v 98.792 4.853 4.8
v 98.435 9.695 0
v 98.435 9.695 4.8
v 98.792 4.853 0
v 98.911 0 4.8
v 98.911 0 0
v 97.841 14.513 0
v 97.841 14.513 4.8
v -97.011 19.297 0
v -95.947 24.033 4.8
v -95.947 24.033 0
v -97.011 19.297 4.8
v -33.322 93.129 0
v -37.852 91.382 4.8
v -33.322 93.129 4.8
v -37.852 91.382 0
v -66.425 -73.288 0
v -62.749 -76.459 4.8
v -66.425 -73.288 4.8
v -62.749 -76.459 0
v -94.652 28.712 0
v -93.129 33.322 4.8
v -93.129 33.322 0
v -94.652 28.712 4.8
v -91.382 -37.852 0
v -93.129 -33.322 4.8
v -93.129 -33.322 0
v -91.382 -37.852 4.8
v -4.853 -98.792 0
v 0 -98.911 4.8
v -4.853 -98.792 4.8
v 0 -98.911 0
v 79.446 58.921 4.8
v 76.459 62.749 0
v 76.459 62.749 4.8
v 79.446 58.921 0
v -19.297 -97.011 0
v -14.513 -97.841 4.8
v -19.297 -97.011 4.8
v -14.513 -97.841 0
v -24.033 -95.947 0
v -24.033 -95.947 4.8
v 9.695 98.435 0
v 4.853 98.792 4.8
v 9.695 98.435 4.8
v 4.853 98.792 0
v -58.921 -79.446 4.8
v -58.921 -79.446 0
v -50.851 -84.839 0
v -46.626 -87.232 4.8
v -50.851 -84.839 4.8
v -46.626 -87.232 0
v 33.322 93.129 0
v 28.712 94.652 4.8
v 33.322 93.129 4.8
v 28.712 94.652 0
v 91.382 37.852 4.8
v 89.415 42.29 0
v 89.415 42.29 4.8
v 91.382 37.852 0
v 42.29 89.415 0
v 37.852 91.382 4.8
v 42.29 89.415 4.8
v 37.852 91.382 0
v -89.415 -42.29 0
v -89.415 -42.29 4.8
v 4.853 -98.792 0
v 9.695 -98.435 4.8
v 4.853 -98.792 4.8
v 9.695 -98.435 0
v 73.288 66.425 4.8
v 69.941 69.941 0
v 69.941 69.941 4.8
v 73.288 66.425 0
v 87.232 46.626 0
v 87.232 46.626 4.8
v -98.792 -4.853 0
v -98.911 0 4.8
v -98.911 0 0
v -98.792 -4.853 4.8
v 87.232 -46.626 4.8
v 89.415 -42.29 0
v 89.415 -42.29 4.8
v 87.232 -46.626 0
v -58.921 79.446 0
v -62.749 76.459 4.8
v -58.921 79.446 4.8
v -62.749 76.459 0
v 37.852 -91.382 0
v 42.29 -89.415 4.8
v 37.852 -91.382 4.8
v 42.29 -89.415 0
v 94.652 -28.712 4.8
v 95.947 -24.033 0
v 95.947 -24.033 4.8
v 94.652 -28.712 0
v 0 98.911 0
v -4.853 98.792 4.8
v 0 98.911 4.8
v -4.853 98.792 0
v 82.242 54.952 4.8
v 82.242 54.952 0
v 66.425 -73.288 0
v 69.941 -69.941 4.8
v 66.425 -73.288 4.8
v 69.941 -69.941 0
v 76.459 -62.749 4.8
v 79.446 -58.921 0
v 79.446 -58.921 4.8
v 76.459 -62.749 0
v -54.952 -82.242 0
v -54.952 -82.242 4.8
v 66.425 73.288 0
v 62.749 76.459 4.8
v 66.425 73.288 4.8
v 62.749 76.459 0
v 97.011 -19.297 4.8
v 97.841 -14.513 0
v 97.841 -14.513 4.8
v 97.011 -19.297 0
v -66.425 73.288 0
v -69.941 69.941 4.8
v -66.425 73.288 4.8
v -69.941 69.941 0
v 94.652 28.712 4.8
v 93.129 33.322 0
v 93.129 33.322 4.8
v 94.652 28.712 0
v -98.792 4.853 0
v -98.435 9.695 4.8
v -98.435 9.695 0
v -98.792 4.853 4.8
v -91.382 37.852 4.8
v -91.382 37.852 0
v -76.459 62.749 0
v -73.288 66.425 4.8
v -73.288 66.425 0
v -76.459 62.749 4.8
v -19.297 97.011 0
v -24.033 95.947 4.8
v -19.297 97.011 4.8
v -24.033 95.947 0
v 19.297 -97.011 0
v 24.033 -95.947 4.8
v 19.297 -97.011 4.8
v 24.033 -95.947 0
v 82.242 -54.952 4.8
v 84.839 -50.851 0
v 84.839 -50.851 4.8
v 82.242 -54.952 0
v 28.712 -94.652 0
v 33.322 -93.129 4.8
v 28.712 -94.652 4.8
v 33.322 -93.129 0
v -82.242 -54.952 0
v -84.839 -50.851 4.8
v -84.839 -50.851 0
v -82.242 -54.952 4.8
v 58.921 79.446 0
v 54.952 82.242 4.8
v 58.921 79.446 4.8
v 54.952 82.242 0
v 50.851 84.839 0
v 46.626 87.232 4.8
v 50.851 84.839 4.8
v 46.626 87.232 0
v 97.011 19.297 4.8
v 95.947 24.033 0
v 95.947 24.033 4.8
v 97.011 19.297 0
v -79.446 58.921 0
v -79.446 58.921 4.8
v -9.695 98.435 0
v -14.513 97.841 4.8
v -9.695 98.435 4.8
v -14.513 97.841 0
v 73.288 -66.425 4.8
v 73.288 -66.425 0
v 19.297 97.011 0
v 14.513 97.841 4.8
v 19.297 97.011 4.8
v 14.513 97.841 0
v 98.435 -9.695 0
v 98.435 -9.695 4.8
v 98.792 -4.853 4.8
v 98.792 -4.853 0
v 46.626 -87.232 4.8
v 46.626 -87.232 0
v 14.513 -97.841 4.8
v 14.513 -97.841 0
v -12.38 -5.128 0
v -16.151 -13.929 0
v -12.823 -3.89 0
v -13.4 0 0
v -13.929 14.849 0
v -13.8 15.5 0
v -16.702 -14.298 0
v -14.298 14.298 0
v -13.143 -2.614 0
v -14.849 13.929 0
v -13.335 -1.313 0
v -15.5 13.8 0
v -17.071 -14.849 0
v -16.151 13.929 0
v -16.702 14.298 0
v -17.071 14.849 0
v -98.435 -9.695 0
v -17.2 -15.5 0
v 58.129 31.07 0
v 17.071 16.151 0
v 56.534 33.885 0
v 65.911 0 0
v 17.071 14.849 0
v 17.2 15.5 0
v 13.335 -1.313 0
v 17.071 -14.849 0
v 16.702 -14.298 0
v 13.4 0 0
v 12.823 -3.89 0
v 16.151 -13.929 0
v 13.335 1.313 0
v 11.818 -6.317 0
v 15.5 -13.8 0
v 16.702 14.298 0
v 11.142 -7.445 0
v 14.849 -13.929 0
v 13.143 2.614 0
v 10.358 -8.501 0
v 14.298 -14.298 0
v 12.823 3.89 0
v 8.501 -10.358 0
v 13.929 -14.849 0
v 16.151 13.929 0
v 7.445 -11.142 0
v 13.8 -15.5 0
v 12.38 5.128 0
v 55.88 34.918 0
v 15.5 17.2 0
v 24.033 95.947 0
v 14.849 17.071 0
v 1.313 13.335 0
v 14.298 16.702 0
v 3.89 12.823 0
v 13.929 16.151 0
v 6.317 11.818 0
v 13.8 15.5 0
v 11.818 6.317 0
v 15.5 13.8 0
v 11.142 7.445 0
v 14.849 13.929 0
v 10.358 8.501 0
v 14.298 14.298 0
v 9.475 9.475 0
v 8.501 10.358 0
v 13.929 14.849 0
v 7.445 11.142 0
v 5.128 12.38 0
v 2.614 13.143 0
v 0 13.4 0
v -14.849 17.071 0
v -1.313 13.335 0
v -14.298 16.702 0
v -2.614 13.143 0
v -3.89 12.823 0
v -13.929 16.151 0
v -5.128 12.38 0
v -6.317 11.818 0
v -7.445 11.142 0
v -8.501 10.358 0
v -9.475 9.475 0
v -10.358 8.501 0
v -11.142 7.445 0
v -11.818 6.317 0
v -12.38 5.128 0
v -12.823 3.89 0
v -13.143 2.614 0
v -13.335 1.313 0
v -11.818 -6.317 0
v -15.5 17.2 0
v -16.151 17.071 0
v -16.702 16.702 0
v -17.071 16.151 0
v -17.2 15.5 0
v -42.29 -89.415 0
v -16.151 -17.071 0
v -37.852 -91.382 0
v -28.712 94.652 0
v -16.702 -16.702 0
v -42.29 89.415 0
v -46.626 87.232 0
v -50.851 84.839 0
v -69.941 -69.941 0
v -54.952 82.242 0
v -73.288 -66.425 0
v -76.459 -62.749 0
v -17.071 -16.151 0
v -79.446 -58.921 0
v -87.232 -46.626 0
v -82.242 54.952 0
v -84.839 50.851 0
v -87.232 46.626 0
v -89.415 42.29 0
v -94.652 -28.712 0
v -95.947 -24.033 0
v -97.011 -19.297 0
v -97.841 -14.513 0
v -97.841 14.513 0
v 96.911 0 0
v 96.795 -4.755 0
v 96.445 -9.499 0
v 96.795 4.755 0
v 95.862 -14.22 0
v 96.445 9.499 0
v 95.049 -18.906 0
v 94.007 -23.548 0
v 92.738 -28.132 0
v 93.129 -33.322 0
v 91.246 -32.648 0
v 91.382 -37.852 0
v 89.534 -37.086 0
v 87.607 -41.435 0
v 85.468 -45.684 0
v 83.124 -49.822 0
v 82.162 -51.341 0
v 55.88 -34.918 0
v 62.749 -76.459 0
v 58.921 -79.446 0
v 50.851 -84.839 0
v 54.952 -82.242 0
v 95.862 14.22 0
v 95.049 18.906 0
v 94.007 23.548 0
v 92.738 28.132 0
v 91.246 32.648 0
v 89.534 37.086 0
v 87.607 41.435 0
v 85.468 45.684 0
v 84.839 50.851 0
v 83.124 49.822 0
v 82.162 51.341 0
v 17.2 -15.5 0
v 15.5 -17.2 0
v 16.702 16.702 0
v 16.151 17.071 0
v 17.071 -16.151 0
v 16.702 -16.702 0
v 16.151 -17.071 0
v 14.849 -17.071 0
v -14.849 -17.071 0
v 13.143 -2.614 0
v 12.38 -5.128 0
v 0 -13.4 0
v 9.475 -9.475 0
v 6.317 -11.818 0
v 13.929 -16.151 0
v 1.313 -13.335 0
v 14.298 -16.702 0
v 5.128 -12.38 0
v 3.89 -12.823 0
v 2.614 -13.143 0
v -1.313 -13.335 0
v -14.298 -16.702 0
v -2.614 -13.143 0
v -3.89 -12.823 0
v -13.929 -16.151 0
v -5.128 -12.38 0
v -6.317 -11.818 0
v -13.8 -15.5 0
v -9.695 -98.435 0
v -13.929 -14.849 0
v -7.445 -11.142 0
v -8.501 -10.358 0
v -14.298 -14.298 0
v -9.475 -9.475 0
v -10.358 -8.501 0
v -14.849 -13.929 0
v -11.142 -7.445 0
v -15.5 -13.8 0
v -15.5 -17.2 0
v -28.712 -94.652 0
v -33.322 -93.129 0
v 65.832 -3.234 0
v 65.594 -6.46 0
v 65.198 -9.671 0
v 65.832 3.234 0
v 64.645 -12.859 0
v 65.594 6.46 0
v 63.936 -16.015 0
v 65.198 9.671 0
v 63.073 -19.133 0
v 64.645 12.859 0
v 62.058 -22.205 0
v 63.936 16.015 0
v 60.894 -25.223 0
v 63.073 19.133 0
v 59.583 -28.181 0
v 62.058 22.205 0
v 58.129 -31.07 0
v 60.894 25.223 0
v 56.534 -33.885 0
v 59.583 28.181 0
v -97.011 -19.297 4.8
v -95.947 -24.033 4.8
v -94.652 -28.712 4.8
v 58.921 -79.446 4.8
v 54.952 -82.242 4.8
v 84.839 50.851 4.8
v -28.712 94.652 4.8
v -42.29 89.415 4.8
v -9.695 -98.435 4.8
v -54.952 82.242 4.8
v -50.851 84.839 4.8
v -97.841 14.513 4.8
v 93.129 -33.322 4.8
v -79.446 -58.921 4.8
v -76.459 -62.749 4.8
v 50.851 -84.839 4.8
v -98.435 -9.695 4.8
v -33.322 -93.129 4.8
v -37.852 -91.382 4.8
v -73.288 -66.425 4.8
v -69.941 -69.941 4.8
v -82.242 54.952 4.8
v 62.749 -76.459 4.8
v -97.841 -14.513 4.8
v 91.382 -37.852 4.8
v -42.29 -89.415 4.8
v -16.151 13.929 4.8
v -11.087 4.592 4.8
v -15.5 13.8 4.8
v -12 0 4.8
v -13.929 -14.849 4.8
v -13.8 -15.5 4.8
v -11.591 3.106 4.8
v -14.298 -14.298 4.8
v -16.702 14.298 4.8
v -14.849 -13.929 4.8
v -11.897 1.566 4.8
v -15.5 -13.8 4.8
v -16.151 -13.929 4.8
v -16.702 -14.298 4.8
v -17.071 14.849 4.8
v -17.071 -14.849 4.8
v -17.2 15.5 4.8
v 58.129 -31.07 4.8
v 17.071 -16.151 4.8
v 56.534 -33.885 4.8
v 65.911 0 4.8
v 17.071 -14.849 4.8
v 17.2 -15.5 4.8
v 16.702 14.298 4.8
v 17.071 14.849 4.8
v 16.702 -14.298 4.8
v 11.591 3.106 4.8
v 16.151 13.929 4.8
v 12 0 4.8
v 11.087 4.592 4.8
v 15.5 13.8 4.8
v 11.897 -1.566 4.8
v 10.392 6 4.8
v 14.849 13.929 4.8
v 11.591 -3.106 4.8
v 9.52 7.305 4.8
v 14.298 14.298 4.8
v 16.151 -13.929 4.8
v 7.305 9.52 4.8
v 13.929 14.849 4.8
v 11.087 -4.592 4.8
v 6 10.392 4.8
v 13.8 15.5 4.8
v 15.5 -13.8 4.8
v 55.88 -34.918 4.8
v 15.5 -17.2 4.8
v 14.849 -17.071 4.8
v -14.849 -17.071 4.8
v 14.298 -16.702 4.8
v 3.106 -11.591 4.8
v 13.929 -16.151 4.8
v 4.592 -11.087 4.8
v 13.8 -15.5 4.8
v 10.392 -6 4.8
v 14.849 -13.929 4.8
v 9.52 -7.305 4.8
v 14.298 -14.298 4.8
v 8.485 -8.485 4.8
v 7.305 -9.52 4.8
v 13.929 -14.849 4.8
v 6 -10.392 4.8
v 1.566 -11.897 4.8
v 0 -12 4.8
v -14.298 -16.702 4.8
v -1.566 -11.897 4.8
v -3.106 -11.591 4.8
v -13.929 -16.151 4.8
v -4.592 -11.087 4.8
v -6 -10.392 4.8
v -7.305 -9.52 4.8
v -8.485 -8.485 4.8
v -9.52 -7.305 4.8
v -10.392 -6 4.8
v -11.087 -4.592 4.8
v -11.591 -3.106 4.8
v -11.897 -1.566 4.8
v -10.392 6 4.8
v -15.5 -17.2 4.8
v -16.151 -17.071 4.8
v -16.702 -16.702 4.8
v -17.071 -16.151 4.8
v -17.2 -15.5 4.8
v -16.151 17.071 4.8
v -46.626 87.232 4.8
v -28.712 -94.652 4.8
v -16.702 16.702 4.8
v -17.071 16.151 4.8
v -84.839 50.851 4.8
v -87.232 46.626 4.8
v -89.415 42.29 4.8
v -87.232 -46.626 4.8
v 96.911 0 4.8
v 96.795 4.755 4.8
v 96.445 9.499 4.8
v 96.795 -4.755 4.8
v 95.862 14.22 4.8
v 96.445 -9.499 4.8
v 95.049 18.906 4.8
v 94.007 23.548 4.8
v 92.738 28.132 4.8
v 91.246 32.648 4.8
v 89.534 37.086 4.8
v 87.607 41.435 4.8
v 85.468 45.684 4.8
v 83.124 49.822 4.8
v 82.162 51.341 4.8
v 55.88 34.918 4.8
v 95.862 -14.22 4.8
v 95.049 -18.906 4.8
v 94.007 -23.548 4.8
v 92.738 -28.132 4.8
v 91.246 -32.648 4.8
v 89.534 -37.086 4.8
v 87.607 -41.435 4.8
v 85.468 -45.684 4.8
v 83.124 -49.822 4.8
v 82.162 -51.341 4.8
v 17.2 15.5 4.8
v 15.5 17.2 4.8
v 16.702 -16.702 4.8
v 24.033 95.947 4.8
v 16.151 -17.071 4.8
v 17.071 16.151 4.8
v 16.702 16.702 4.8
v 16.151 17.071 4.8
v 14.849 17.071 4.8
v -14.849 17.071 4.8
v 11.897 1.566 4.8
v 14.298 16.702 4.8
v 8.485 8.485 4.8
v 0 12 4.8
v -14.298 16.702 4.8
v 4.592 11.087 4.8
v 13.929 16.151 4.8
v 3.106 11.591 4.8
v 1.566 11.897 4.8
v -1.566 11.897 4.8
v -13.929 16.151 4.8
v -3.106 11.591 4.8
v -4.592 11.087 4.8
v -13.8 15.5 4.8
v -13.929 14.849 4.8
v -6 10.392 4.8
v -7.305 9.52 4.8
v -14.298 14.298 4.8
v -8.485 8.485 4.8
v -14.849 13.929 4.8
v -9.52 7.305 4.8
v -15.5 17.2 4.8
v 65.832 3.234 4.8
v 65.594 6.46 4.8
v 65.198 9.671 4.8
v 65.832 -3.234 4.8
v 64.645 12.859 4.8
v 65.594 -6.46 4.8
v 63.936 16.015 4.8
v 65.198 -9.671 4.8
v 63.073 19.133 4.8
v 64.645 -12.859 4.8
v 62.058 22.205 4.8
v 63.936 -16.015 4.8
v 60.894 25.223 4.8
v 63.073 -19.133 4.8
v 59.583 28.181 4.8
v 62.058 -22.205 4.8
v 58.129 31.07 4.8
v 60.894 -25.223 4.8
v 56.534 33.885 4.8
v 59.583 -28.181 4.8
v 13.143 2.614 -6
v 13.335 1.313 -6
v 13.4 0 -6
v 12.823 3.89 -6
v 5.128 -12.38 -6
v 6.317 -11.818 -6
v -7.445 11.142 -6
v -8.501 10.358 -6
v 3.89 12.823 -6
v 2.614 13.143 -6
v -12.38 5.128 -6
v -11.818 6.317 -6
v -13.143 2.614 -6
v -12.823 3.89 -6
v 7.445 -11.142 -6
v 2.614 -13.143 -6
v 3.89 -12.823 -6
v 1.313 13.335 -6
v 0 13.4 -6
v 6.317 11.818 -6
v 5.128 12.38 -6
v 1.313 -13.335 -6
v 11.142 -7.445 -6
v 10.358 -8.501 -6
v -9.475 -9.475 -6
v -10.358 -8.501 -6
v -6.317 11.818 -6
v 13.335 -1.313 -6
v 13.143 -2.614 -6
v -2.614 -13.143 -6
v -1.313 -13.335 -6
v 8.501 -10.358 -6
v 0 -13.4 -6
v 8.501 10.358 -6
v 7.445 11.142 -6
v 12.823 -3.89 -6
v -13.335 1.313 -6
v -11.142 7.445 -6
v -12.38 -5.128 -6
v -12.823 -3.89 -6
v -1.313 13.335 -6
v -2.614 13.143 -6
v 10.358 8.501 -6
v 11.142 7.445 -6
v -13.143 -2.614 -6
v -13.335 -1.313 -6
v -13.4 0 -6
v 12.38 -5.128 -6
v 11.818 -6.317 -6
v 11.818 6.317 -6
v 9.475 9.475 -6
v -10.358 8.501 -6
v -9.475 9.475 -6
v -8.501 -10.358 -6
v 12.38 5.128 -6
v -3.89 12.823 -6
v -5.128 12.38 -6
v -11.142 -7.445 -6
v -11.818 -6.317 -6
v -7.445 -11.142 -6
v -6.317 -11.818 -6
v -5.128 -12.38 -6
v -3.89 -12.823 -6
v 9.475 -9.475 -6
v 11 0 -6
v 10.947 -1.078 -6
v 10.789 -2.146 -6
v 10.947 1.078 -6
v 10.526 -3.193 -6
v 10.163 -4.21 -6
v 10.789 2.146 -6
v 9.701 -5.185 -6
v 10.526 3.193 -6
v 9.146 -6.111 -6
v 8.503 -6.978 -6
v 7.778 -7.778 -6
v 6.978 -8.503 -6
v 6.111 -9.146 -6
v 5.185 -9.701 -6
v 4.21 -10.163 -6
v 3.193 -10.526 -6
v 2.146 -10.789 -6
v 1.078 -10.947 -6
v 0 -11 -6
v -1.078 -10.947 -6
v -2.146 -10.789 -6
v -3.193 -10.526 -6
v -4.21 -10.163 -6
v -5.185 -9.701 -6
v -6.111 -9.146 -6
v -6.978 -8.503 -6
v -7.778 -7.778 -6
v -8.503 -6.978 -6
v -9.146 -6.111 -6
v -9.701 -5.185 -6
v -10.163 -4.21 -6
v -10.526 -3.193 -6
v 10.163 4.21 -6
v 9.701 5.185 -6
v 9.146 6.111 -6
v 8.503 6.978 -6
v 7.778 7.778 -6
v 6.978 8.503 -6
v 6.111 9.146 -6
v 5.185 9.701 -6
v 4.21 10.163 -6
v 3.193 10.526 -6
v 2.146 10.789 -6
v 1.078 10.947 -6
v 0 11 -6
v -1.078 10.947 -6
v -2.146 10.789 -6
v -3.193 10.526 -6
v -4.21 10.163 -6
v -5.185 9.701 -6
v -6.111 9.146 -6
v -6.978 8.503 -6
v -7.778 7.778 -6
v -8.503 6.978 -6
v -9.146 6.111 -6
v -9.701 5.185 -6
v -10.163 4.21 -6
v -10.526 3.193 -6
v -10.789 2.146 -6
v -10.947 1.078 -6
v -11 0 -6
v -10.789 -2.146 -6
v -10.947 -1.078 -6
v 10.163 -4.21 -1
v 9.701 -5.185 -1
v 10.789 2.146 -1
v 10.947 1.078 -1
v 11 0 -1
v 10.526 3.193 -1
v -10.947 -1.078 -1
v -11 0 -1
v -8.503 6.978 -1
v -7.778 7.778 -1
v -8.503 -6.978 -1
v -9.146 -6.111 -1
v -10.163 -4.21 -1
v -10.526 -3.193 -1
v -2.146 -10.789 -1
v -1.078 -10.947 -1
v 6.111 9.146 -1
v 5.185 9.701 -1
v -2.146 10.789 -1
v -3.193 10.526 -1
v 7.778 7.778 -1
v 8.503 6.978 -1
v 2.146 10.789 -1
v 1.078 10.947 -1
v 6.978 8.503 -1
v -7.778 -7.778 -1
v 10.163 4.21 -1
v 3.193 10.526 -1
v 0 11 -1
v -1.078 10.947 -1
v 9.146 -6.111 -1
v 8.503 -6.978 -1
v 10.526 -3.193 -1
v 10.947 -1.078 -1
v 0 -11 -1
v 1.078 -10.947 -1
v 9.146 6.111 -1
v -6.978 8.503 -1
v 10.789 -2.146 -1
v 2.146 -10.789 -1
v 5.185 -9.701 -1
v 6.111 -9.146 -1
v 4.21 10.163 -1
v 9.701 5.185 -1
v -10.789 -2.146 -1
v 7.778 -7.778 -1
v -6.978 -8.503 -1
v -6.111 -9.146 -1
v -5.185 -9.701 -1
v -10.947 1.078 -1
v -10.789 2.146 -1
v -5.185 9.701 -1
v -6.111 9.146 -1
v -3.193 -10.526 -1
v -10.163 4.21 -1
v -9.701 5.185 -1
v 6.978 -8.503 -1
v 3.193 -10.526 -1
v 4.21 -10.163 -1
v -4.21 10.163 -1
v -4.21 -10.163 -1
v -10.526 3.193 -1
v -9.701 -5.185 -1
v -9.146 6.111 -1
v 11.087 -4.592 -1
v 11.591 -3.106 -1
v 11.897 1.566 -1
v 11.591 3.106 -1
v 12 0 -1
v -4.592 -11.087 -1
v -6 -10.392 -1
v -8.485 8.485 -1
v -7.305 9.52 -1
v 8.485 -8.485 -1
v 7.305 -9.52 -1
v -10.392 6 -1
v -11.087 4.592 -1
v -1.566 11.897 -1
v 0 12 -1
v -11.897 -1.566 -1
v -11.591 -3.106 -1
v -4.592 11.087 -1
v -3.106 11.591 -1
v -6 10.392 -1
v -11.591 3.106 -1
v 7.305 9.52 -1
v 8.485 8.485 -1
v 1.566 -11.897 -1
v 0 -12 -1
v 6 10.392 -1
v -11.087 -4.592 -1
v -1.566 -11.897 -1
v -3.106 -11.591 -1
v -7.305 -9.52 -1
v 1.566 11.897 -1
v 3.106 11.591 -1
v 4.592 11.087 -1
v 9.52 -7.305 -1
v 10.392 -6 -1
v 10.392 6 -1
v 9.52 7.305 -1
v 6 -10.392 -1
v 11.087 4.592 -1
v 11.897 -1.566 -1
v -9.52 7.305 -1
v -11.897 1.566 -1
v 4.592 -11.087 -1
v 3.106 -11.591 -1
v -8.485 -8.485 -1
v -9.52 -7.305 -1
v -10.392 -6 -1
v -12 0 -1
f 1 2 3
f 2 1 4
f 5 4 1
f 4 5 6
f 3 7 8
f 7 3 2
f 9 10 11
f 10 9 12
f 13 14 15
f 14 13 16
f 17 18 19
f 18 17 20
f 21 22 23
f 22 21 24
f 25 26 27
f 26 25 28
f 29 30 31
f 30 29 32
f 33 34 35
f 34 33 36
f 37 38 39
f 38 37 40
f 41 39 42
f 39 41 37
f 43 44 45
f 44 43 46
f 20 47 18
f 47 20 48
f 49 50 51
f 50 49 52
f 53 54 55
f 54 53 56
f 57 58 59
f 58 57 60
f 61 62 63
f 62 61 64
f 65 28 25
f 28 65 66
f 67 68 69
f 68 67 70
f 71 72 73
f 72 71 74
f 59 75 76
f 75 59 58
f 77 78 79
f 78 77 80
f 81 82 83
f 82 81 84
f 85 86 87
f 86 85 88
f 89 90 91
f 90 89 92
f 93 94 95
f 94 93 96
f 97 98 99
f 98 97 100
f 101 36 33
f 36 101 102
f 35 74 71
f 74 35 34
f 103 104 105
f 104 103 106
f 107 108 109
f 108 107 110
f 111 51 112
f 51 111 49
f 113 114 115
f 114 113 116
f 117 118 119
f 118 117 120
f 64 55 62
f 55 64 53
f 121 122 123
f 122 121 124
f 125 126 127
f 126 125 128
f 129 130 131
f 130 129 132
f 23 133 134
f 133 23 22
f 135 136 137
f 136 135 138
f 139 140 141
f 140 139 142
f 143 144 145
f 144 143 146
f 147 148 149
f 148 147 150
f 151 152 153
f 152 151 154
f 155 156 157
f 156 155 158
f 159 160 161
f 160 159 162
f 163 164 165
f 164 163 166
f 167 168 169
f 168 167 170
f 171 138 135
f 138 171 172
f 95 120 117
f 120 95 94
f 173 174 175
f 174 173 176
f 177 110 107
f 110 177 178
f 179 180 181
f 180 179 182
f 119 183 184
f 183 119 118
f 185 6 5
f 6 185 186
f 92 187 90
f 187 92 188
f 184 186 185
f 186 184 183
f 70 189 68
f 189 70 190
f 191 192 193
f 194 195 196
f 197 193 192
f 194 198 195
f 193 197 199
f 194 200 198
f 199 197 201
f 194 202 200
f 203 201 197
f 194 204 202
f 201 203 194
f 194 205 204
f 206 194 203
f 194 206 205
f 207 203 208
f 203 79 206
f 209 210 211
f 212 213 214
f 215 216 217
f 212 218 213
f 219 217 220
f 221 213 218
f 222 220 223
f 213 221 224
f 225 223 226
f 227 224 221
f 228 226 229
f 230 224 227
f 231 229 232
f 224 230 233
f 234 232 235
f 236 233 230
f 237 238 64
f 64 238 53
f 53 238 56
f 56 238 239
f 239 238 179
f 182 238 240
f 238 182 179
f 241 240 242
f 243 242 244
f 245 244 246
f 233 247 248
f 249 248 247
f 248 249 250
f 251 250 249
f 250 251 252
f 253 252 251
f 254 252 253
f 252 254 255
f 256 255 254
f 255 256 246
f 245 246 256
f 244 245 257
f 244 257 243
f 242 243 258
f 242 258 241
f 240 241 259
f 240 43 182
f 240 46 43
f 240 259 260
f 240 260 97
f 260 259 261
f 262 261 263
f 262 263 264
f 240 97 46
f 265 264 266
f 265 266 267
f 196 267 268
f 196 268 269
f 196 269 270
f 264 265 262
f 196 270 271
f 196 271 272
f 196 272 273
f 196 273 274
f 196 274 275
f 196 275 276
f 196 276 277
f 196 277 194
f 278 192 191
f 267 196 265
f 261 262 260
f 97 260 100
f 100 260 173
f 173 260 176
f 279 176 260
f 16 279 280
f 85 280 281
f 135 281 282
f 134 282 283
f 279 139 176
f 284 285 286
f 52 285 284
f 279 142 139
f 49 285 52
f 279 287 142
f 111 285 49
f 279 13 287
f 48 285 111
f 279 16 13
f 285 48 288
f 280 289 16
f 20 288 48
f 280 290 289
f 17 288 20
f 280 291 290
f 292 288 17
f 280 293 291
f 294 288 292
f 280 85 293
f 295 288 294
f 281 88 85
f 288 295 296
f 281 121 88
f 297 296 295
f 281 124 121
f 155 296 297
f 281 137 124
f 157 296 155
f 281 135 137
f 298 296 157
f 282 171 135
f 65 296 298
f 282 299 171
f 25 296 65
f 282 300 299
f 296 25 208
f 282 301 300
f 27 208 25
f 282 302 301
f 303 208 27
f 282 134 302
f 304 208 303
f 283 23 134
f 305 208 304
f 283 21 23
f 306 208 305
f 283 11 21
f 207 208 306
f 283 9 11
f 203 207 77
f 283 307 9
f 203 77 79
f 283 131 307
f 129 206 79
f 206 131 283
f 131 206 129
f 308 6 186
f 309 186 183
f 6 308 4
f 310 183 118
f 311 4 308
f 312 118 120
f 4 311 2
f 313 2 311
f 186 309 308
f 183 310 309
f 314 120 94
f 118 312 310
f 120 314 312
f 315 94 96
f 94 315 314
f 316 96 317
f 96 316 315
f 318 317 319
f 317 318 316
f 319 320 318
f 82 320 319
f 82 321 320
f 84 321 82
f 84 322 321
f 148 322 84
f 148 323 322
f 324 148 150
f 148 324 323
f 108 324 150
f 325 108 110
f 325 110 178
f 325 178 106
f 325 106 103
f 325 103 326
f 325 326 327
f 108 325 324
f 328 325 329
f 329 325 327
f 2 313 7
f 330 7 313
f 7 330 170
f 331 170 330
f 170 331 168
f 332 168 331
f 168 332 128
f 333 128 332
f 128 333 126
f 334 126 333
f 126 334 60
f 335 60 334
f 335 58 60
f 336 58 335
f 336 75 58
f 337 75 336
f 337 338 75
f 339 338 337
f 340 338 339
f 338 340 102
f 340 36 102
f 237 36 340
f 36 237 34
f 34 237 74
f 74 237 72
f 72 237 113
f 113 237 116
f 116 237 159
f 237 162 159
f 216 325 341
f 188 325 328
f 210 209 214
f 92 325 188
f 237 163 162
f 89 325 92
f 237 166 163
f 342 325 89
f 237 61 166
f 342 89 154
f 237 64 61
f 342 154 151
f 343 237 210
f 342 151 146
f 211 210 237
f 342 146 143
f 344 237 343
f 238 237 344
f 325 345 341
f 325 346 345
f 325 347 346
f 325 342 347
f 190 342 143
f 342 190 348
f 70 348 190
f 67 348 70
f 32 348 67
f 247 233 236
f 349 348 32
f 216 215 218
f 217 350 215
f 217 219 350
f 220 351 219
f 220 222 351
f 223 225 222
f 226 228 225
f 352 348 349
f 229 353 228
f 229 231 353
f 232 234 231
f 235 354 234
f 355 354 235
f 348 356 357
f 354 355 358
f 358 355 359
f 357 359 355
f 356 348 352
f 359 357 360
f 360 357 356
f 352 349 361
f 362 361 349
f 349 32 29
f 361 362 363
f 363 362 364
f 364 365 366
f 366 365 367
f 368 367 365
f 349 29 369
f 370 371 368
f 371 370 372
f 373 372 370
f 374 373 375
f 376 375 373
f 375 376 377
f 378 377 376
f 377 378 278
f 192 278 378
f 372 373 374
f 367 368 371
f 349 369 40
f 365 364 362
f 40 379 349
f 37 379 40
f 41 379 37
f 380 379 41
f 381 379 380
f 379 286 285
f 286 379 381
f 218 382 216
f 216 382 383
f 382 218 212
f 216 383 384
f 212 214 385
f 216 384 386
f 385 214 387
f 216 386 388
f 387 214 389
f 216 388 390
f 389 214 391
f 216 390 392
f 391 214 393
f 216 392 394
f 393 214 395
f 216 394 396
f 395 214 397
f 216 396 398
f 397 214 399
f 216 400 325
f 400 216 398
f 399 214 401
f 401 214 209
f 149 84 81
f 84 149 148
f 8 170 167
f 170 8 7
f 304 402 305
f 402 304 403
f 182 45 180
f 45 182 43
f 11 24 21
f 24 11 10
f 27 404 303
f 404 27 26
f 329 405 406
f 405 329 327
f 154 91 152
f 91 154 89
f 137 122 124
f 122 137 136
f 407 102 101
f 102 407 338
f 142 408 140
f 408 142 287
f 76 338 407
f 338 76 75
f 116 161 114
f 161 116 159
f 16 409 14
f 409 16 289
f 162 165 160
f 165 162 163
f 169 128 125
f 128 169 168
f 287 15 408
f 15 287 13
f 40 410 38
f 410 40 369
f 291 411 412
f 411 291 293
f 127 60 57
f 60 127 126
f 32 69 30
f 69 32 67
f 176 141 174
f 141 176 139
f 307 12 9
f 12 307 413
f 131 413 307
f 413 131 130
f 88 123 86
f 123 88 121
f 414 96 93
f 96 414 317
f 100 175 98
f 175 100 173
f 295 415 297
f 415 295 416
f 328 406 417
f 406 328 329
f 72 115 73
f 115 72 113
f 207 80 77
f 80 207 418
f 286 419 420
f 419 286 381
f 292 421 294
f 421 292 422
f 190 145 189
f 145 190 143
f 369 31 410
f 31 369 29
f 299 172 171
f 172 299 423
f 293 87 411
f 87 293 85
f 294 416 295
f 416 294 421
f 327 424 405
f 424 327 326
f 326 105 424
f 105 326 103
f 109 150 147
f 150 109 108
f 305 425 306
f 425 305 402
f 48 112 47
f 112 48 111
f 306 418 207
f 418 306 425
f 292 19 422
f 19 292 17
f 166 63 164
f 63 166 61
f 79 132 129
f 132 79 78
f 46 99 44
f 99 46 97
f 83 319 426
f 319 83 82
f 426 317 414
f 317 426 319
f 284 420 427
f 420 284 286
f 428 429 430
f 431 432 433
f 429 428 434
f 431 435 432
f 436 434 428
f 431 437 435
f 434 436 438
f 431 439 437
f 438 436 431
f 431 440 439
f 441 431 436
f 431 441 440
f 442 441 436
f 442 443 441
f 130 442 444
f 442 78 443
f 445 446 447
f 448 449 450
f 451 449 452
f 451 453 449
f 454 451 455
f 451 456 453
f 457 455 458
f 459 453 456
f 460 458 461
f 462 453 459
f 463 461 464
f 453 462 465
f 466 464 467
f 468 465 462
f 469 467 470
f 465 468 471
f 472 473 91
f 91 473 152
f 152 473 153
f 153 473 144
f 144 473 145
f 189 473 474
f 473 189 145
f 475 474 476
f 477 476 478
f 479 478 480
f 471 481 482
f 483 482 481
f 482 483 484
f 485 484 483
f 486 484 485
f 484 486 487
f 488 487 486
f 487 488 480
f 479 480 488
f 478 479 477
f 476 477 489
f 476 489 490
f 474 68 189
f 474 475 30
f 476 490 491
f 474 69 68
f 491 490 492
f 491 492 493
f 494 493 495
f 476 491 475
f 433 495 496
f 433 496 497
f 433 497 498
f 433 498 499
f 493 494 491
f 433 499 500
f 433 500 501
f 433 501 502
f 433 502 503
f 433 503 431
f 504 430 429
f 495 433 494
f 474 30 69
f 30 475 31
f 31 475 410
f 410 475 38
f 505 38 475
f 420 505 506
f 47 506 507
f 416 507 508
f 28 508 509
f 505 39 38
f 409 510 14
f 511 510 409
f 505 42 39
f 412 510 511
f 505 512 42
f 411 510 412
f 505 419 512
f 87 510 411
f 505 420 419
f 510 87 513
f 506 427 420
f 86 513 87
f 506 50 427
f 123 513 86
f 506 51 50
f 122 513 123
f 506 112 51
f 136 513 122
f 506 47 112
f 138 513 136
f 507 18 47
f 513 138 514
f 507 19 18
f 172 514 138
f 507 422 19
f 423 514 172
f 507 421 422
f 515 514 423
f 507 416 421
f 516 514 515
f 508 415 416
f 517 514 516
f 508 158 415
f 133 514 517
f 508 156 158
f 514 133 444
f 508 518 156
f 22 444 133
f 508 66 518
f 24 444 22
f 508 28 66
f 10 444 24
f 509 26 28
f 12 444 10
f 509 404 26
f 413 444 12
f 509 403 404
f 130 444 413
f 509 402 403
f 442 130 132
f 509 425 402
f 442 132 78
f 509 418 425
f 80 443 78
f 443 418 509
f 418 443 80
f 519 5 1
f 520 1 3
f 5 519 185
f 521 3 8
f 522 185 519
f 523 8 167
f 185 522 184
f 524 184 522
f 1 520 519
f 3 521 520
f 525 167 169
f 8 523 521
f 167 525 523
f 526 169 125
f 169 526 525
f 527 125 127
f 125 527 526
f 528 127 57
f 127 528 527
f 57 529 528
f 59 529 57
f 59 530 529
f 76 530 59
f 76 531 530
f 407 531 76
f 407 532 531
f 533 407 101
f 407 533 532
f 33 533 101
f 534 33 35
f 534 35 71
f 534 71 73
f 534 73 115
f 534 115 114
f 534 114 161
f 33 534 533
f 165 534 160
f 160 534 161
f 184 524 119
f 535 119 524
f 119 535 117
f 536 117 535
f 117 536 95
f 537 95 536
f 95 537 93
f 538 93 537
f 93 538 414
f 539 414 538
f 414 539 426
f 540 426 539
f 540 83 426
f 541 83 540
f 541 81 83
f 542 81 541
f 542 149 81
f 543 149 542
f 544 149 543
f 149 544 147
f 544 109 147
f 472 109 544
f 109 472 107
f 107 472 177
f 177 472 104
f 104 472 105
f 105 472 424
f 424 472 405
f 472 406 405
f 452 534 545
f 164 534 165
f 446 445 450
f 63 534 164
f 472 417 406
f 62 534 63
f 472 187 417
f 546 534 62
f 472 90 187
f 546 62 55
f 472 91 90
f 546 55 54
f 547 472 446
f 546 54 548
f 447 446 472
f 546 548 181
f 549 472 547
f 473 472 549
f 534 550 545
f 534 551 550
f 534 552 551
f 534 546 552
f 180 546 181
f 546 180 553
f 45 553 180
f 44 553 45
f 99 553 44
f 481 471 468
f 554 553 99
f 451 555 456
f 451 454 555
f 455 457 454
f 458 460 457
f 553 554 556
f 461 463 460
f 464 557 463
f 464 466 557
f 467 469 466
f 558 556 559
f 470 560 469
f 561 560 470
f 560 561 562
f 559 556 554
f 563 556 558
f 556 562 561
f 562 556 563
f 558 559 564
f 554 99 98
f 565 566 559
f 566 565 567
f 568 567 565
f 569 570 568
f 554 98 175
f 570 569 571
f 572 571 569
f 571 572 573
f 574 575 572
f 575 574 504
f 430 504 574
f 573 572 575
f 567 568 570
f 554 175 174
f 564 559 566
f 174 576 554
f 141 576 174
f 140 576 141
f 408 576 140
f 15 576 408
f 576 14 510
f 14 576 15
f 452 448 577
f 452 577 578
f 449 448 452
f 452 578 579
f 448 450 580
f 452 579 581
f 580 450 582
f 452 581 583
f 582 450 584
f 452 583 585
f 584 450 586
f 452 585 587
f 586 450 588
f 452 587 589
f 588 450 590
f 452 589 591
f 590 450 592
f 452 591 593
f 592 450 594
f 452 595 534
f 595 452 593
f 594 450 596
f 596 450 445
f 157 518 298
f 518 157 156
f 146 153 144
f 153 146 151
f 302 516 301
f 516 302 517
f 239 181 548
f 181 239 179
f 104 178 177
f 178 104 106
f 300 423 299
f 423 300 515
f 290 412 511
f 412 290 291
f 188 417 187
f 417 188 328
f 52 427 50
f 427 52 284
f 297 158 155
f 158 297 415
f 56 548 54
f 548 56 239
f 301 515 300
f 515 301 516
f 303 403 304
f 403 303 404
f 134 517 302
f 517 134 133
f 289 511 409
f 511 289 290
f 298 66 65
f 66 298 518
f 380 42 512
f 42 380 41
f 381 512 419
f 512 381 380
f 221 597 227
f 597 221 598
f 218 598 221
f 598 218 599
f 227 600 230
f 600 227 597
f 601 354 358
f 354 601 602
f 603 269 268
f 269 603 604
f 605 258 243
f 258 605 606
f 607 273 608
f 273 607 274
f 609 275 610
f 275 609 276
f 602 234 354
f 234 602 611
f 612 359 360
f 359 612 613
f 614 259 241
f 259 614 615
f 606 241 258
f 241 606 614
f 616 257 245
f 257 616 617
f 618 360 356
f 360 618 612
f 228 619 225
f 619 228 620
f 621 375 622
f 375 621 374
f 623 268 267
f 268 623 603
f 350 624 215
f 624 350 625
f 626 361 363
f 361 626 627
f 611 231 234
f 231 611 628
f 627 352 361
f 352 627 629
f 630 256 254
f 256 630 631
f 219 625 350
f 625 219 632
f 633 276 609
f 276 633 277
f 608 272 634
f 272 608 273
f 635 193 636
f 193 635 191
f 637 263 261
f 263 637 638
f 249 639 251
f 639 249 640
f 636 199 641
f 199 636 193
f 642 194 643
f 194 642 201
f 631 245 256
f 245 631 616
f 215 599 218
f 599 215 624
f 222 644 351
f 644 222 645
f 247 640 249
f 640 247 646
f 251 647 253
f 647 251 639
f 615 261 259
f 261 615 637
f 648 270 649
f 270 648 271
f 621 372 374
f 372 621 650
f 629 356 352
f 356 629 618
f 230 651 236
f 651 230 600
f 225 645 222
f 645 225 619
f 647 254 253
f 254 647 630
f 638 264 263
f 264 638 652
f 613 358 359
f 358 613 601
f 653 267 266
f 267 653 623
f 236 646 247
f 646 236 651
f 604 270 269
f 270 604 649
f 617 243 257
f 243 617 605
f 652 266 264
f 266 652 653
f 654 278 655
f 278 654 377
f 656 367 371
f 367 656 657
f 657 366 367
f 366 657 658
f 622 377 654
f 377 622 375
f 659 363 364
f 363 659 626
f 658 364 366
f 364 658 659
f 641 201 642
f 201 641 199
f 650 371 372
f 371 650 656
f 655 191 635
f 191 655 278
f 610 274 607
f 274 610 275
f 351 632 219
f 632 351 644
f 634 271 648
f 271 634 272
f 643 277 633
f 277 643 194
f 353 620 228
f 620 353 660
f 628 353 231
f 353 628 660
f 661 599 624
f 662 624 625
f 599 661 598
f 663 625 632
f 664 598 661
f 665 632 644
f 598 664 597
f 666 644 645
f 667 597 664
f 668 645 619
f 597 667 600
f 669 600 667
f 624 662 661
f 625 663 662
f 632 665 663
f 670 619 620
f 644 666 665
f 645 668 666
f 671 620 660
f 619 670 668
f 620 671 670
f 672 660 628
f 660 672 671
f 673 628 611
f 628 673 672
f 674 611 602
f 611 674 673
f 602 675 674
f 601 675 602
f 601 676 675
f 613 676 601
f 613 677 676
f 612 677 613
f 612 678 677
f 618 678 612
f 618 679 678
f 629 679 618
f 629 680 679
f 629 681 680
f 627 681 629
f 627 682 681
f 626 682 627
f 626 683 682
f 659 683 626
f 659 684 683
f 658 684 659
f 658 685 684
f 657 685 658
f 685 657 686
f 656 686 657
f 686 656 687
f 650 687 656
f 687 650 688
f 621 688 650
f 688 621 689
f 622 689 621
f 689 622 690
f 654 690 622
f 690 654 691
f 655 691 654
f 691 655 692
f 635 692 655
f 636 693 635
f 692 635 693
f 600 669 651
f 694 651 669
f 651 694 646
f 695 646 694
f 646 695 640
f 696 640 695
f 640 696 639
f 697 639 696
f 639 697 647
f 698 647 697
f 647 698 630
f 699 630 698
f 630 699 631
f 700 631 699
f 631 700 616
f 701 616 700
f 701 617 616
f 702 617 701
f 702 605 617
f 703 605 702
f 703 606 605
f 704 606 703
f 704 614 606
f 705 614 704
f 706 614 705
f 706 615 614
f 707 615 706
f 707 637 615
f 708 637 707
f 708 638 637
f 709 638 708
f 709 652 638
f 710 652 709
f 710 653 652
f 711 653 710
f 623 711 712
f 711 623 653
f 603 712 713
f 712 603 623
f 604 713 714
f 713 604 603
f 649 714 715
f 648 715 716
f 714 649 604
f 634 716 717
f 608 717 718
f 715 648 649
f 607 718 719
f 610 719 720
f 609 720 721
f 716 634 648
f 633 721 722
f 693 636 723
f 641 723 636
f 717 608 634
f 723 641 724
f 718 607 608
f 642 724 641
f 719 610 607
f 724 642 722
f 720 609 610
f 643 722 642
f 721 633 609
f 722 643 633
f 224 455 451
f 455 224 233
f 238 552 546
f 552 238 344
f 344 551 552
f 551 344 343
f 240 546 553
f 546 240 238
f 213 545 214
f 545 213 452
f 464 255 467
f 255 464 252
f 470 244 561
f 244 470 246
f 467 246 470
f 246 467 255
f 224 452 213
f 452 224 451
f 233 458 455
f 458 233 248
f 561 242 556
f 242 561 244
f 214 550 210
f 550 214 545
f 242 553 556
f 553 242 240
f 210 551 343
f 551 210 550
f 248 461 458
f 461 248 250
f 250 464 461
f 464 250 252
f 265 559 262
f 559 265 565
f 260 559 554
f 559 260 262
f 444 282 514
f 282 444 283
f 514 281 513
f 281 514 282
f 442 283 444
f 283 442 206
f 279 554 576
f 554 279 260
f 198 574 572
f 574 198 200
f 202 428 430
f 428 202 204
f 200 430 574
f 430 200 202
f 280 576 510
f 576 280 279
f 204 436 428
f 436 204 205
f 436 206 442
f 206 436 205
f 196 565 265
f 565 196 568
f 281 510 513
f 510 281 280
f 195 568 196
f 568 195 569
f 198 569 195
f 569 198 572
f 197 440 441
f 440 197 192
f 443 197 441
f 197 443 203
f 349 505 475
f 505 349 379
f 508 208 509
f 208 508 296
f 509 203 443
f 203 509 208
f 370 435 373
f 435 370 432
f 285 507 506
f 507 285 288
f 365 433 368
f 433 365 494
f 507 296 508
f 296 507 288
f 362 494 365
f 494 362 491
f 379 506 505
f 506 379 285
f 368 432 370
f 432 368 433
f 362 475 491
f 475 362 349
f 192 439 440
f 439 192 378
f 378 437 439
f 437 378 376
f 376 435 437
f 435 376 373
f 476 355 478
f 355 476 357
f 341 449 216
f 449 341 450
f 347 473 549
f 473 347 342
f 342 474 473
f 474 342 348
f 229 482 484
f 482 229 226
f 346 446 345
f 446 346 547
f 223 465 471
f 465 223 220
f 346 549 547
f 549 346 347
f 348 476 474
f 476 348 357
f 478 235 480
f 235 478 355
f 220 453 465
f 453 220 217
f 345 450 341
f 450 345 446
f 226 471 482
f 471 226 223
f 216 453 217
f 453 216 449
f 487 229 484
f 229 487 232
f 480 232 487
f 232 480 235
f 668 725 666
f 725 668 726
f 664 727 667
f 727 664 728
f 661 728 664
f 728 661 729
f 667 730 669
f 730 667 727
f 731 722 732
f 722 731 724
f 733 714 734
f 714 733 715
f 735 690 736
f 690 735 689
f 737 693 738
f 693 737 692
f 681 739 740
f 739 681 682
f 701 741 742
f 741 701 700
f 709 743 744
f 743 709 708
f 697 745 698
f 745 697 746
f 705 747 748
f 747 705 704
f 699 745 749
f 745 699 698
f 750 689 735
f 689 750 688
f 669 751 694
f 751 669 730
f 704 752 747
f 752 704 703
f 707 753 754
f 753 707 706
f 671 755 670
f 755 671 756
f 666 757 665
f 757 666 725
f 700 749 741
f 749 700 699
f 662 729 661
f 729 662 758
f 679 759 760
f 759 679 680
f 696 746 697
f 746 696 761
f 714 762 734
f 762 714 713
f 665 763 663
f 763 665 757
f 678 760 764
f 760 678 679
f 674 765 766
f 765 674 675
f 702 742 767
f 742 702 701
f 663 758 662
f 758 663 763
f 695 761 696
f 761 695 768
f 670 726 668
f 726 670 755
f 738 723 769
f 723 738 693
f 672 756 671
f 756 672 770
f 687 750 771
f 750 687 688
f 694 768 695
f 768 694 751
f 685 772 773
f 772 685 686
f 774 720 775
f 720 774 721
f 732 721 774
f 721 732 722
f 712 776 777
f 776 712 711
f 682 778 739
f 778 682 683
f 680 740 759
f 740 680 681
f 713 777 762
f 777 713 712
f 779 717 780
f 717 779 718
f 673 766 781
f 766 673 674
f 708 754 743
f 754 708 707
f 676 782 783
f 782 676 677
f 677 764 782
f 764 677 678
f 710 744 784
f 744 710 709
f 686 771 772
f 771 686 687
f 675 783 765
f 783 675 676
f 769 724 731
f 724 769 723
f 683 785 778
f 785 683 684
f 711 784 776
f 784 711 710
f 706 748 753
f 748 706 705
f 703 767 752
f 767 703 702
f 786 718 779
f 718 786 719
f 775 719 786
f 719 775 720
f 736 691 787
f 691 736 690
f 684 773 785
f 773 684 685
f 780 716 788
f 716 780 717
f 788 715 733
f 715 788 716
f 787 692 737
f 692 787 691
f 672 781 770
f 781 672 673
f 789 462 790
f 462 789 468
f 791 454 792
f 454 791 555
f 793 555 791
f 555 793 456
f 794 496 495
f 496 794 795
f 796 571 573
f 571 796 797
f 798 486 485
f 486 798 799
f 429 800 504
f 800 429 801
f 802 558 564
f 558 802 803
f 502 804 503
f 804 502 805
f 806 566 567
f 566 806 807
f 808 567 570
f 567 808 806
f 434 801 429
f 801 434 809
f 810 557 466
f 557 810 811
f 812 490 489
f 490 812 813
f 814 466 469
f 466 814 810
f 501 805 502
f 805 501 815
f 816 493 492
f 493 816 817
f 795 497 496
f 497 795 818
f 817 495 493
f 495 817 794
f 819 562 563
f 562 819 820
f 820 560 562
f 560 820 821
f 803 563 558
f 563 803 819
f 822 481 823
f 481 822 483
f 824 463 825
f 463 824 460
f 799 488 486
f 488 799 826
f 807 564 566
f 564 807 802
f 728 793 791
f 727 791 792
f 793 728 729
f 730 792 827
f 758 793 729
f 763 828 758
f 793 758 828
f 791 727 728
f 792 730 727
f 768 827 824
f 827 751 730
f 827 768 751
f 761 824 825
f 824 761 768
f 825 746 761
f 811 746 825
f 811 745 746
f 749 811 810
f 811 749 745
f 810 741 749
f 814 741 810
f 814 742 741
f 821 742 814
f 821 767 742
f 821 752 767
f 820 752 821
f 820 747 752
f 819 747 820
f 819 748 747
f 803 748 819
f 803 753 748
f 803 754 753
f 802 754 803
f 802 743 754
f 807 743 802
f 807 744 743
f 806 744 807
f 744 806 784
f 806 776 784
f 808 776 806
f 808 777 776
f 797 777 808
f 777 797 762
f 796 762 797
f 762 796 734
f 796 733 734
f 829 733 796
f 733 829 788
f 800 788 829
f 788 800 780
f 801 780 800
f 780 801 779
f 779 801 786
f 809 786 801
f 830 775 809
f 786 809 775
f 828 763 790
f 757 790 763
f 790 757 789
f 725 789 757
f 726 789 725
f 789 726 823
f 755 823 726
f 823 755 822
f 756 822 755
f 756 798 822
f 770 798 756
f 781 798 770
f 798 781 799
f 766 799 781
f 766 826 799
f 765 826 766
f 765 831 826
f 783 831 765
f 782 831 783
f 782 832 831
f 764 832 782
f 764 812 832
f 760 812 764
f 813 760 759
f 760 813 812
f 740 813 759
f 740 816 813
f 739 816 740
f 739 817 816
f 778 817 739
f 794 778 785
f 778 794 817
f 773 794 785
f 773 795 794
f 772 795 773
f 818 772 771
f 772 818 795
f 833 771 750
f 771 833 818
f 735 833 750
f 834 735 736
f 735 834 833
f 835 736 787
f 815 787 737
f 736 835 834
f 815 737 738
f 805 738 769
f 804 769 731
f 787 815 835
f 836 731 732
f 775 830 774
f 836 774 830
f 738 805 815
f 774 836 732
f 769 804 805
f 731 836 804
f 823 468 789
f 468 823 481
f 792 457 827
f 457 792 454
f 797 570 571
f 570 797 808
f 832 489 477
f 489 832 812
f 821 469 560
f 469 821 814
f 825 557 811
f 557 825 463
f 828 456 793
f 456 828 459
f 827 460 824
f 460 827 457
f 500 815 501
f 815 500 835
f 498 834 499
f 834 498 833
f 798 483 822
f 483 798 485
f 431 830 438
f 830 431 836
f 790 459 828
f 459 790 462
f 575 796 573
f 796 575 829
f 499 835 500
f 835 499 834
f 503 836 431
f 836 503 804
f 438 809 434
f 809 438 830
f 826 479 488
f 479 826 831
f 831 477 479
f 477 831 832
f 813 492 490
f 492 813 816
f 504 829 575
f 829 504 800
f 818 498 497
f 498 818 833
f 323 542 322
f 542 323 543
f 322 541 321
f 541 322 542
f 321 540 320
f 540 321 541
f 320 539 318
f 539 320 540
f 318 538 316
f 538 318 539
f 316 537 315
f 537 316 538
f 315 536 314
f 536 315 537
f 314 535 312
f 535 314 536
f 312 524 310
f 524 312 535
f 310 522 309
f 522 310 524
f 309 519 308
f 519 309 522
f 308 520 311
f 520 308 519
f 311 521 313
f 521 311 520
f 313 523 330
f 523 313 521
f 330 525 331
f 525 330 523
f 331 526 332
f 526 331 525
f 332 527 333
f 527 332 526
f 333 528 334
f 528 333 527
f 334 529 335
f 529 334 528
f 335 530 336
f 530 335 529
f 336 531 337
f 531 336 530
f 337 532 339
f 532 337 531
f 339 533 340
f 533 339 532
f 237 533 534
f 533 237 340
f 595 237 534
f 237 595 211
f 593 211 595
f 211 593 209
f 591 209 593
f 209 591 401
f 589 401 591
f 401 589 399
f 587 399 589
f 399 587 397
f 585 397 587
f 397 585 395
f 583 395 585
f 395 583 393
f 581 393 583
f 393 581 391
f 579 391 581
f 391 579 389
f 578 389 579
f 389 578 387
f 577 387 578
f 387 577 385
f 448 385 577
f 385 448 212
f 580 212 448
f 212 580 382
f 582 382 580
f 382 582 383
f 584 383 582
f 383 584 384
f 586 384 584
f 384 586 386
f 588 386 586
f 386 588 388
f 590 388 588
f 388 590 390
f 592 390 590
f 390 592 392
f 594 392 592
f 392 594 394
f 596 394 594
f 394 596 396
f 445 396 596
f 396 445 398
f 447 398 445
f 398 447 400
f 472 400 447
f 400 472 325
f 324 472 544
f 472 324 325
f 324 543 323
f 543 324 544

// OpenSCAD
// file: helpers.scad
// Shared 2D helpers used by wedge.scad, base.scad and lid.scad.

// Big half-plane (y >= 0), used to build angle masks. `big` just has to be
// larger than any radius used in the design.
module halfplane(big = 2000) {
    translate([-big/2, 0]) square([big, big]);
}

// An angular mask covering [-a/2, +a/2], built as the intersection of two
// half-planes rather than an origin-apex polygon: a sector polygon with its
// point pinned exactly at (0,0) tends to produce a self-touching ("bowtie")
// result once differenced against a same-apex sector for the inner radius,
// which extrudes into a non-manifold solid. Two rotated half-planes never
// share that degenerate vertex.
module angle_mask(a) {
    intersection() {
        rotate([0, 0, -a/2]) halfplane();
        rotate([0, 0, a/2 - 180]) halfplane();
    }
}

// A ring slice between radius r1 and r2, angular width a, centered on angle 0.
module ring_slice(r1, r2, a) {
    intersection() {
        difference() {
            circle(r = r2, $fn = 128);
            circle(r = r1, $fn = 128);
        }
        angle_mask(a);
    }
}
// file: params.scad
// Shared parameters for the whole dispenser — edit these once, every part
// (hub, wedges, base, lid) picks them up via `include`.
// Measure your own packs before printing: hard packs vary a few mm by brand.

slots      = 6;     // number of pockets around the carousel
pack_w     = 55;    // pack width (mm)  - sits tangentially (packs stand upright)
pack_d     = 22;    // pack depth (mm)  - sits radially
pack_h     = 85;    // pack height (mm) - packs stand upright in the pocket
clear      = 3;     // per-side clearance around a pack
wall       = 2.4;   // wall thickness (~6 perimeters at 0.4mm nozzle, PETG)

gap_deg    = 2;                     // angular gap left between neighboring wedges
ang        = 360/slots - gap_deg;   // usable angle per wedge

hub_margin = 6;      // extra radius beyond the strict minimum (wall + boss room)

// r_in is derived, not hand-picked: the tangential width available at r_in
// for one wedge (a chord of angle `ang`) must be >= pack_w + 2*clear, or the
// pack won't fit — sizing this by hand for hub.scad, wedge.scad and base.scad
// separately caused pockets narrower than the pack in an earlier revision.
r_in       = (pack_w + 2*clear) / (2*sin(ang/2)) + hub_margin;
r_out      = r_in + pack_d + clear;

hub_od     = 2 * (r_in - 2);  // hub sits just inside r_in
hub_id     = 8;               // bore for the motor shaft coupler (mm)
hub_height = pack_h + clear + wall;

boss_d     = 6;      // hub attachment boss diameter
boss_hole  = 3.2;    // clearance hole for M3 screw
// main file
// Stationary base plate — print 1x. The carousel (hub + wedges) sits and
// spins on top of this. Every pocket's floor IS this plate, except at the
// chute cutout: that's the only spot a pack can fall through, and it only
// lines up with one pocket at a time as the stepper indexes the carousel.
include <params.scad>
include <helpers.scad>

plate_od      = r_out * 2 + 10;   // overall plate diameter
plate_t       = wall * 2;         // plate thickness
bearing_od    = 22;   // 608-size skate bearing OD (swap for your bearing)
bearing_boss_h= 6;

// NEMA17-ish mounting pattern (also fits most small gearmotors if you
// re-drill): 31mm bolt spacing, M3 clearance, adjust to your motor's specs.
motor_hole_spacing = 31;
motor_hole_d        = 3.4;
motor_bore_d         = 24;  // clearance for the motor's boss/shaft collar

// chute cutout: same sector as one pocket, oversized slightly so it clears
// the pocket that is dropping, positioned at angle 0 (see wiring.md for how
// the home/index sensor is used to align pocket 0 here at startup).
chute_margin = clear;

module base() {
    difference() {
        union() {
            cylinder(d = plate_od, h = plate_t, $fn = 128);
            // bearing boss under the hub, on the underside
            translate([0, 0, -bearing_boss_h])
                cylinder(d = bearing_od + wall*2, h = bearing_boss_h, $fn = 64);
        }
        // bearing seat (press-fit a 608 skate bearing, or substitute a
        // plain PTFE-lined bushing sized to your motor shaft coupler)
        translate([0, 0, -bearing_boss_h - 1])
            cylinder(d = bearing_od, h = bearing_boss_h + 2, $fn = 64);
        // motor shaft clearance through the plate
        translate([0, 0, -1])
            cylinder(d = motor_bore_d, h = plate_t + bearing_boss_h + 2, $fn = 48);
        // motor mounting holes
        for (i = [0:3])
            rotate([0, 0, i*90 + 45])
                translate([motor_hole_spacing/sqrt(2), 0, -bearing_boss_h - 1])
                    cylinder(d = motor_hole_d, h = bearing_boss_h + plate_t + 2, $fn = 16);
        // the chute: same sector shape as a pocket, at angle 0, oversized
        // by chute_margin so it fully clears whichever pocket sits over it
        translate([0, 0, -1])
            linear_extrude(height = plate_t + 2)
                ring_slice(r_in - chute_margin, r_out + chute_margin, ang + 2*chute_margin);
    }
}

base();
